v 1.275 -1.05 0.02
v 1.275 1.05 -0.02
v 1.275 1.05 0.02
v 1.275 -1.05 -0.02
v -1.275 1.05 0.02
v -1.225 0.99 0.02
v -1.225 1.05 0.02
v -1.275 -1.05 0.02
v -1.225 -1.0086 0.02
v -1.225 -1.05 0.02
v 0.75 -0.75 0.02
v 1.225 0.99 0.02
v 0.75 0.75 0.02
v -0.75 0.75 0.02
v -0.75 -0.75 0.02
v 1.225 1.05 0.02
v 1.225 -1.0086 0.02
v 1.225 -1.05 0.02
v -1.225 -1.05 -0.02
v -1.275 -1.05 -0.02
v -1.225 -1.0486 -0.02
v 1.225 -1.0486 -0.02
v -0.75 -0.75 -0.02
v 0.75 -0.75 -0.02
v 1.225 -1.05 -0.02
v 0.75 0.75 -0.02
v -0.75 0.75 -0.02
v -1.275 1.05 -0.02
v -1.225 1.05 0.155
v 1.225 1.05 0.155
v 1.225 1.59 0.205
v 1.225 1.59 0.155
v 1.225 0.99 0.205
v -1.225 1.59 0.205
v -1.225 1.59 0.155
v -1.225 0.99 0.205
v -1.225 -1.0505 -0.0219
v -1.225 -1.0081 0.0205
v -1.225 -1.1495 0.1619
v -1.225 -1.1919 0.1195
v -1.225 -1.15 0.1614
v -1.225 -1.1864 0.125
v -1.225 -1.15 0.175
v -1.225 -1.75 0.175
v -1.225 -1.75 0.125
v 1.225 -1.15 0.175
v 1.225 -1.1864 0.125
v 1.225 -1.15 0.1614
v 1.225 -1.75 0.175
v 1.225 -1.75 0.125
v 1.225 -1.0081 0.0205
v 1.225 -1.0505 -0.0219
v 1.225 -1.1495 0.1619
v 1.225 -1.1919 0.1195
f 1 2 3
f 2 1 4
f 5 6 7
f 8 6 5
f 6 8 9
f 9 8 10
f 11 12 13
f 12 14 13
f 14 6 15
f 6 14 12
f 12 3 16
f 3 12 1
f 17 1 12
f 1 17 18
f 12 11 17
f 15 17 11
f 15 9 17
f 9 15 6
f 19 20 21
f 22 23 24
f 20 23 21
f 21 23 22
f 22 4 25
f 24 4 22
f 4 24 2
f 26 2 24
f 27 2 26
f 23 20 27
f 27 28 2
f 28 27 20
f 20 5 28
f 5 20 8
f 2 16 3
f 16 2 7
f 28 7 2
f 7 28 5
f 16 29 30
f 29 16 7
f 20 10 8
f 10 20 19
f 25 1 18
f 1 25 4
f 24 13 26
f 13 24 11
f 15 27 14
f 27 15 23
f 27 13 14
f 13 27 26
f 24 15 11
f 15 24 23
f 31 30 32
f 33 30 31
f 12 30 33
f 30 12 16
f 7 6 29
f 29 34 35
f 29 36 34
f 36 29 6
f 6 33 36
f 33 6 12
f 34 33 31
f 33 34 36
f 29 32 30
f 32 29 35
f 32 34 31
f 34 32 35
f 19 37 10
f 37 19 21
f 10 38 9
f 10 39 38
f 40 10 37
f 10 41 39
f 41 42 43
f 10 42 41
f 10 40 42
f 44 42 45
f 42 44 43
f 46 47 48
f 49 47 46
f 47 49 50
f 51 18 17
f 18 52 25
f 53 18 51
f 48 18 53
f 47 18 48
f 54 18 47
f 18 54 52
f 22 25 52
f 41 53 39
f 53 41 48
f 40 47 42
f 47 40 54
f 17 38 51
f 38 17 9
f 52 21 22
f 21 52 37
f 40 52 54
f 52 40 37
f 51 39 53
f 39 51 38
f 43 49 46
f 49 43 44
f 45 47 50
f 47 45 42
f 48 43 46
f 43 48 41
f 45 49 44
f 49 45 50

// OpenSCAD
difference()
{
    cube( [2.55, 2.1,0.04 ], true );
    
    cube( [1.5, 1.5, 0.1], true );
}

translate([0, 1.02, 0.09])
cube( [2.45, 0.06,0.2 ], true );

translate([0, 1.29, 0.18])
cube( [2.45, 0.6,0.05 ], true );



translate([0, -1.1, 0.07])
rotate([45,0,0])
cube( [2.45, 0.06,0.2 ], true );

translate([0, -1.45, 0.15])
cube( [2.45, 0.6,0.05 ], true );
